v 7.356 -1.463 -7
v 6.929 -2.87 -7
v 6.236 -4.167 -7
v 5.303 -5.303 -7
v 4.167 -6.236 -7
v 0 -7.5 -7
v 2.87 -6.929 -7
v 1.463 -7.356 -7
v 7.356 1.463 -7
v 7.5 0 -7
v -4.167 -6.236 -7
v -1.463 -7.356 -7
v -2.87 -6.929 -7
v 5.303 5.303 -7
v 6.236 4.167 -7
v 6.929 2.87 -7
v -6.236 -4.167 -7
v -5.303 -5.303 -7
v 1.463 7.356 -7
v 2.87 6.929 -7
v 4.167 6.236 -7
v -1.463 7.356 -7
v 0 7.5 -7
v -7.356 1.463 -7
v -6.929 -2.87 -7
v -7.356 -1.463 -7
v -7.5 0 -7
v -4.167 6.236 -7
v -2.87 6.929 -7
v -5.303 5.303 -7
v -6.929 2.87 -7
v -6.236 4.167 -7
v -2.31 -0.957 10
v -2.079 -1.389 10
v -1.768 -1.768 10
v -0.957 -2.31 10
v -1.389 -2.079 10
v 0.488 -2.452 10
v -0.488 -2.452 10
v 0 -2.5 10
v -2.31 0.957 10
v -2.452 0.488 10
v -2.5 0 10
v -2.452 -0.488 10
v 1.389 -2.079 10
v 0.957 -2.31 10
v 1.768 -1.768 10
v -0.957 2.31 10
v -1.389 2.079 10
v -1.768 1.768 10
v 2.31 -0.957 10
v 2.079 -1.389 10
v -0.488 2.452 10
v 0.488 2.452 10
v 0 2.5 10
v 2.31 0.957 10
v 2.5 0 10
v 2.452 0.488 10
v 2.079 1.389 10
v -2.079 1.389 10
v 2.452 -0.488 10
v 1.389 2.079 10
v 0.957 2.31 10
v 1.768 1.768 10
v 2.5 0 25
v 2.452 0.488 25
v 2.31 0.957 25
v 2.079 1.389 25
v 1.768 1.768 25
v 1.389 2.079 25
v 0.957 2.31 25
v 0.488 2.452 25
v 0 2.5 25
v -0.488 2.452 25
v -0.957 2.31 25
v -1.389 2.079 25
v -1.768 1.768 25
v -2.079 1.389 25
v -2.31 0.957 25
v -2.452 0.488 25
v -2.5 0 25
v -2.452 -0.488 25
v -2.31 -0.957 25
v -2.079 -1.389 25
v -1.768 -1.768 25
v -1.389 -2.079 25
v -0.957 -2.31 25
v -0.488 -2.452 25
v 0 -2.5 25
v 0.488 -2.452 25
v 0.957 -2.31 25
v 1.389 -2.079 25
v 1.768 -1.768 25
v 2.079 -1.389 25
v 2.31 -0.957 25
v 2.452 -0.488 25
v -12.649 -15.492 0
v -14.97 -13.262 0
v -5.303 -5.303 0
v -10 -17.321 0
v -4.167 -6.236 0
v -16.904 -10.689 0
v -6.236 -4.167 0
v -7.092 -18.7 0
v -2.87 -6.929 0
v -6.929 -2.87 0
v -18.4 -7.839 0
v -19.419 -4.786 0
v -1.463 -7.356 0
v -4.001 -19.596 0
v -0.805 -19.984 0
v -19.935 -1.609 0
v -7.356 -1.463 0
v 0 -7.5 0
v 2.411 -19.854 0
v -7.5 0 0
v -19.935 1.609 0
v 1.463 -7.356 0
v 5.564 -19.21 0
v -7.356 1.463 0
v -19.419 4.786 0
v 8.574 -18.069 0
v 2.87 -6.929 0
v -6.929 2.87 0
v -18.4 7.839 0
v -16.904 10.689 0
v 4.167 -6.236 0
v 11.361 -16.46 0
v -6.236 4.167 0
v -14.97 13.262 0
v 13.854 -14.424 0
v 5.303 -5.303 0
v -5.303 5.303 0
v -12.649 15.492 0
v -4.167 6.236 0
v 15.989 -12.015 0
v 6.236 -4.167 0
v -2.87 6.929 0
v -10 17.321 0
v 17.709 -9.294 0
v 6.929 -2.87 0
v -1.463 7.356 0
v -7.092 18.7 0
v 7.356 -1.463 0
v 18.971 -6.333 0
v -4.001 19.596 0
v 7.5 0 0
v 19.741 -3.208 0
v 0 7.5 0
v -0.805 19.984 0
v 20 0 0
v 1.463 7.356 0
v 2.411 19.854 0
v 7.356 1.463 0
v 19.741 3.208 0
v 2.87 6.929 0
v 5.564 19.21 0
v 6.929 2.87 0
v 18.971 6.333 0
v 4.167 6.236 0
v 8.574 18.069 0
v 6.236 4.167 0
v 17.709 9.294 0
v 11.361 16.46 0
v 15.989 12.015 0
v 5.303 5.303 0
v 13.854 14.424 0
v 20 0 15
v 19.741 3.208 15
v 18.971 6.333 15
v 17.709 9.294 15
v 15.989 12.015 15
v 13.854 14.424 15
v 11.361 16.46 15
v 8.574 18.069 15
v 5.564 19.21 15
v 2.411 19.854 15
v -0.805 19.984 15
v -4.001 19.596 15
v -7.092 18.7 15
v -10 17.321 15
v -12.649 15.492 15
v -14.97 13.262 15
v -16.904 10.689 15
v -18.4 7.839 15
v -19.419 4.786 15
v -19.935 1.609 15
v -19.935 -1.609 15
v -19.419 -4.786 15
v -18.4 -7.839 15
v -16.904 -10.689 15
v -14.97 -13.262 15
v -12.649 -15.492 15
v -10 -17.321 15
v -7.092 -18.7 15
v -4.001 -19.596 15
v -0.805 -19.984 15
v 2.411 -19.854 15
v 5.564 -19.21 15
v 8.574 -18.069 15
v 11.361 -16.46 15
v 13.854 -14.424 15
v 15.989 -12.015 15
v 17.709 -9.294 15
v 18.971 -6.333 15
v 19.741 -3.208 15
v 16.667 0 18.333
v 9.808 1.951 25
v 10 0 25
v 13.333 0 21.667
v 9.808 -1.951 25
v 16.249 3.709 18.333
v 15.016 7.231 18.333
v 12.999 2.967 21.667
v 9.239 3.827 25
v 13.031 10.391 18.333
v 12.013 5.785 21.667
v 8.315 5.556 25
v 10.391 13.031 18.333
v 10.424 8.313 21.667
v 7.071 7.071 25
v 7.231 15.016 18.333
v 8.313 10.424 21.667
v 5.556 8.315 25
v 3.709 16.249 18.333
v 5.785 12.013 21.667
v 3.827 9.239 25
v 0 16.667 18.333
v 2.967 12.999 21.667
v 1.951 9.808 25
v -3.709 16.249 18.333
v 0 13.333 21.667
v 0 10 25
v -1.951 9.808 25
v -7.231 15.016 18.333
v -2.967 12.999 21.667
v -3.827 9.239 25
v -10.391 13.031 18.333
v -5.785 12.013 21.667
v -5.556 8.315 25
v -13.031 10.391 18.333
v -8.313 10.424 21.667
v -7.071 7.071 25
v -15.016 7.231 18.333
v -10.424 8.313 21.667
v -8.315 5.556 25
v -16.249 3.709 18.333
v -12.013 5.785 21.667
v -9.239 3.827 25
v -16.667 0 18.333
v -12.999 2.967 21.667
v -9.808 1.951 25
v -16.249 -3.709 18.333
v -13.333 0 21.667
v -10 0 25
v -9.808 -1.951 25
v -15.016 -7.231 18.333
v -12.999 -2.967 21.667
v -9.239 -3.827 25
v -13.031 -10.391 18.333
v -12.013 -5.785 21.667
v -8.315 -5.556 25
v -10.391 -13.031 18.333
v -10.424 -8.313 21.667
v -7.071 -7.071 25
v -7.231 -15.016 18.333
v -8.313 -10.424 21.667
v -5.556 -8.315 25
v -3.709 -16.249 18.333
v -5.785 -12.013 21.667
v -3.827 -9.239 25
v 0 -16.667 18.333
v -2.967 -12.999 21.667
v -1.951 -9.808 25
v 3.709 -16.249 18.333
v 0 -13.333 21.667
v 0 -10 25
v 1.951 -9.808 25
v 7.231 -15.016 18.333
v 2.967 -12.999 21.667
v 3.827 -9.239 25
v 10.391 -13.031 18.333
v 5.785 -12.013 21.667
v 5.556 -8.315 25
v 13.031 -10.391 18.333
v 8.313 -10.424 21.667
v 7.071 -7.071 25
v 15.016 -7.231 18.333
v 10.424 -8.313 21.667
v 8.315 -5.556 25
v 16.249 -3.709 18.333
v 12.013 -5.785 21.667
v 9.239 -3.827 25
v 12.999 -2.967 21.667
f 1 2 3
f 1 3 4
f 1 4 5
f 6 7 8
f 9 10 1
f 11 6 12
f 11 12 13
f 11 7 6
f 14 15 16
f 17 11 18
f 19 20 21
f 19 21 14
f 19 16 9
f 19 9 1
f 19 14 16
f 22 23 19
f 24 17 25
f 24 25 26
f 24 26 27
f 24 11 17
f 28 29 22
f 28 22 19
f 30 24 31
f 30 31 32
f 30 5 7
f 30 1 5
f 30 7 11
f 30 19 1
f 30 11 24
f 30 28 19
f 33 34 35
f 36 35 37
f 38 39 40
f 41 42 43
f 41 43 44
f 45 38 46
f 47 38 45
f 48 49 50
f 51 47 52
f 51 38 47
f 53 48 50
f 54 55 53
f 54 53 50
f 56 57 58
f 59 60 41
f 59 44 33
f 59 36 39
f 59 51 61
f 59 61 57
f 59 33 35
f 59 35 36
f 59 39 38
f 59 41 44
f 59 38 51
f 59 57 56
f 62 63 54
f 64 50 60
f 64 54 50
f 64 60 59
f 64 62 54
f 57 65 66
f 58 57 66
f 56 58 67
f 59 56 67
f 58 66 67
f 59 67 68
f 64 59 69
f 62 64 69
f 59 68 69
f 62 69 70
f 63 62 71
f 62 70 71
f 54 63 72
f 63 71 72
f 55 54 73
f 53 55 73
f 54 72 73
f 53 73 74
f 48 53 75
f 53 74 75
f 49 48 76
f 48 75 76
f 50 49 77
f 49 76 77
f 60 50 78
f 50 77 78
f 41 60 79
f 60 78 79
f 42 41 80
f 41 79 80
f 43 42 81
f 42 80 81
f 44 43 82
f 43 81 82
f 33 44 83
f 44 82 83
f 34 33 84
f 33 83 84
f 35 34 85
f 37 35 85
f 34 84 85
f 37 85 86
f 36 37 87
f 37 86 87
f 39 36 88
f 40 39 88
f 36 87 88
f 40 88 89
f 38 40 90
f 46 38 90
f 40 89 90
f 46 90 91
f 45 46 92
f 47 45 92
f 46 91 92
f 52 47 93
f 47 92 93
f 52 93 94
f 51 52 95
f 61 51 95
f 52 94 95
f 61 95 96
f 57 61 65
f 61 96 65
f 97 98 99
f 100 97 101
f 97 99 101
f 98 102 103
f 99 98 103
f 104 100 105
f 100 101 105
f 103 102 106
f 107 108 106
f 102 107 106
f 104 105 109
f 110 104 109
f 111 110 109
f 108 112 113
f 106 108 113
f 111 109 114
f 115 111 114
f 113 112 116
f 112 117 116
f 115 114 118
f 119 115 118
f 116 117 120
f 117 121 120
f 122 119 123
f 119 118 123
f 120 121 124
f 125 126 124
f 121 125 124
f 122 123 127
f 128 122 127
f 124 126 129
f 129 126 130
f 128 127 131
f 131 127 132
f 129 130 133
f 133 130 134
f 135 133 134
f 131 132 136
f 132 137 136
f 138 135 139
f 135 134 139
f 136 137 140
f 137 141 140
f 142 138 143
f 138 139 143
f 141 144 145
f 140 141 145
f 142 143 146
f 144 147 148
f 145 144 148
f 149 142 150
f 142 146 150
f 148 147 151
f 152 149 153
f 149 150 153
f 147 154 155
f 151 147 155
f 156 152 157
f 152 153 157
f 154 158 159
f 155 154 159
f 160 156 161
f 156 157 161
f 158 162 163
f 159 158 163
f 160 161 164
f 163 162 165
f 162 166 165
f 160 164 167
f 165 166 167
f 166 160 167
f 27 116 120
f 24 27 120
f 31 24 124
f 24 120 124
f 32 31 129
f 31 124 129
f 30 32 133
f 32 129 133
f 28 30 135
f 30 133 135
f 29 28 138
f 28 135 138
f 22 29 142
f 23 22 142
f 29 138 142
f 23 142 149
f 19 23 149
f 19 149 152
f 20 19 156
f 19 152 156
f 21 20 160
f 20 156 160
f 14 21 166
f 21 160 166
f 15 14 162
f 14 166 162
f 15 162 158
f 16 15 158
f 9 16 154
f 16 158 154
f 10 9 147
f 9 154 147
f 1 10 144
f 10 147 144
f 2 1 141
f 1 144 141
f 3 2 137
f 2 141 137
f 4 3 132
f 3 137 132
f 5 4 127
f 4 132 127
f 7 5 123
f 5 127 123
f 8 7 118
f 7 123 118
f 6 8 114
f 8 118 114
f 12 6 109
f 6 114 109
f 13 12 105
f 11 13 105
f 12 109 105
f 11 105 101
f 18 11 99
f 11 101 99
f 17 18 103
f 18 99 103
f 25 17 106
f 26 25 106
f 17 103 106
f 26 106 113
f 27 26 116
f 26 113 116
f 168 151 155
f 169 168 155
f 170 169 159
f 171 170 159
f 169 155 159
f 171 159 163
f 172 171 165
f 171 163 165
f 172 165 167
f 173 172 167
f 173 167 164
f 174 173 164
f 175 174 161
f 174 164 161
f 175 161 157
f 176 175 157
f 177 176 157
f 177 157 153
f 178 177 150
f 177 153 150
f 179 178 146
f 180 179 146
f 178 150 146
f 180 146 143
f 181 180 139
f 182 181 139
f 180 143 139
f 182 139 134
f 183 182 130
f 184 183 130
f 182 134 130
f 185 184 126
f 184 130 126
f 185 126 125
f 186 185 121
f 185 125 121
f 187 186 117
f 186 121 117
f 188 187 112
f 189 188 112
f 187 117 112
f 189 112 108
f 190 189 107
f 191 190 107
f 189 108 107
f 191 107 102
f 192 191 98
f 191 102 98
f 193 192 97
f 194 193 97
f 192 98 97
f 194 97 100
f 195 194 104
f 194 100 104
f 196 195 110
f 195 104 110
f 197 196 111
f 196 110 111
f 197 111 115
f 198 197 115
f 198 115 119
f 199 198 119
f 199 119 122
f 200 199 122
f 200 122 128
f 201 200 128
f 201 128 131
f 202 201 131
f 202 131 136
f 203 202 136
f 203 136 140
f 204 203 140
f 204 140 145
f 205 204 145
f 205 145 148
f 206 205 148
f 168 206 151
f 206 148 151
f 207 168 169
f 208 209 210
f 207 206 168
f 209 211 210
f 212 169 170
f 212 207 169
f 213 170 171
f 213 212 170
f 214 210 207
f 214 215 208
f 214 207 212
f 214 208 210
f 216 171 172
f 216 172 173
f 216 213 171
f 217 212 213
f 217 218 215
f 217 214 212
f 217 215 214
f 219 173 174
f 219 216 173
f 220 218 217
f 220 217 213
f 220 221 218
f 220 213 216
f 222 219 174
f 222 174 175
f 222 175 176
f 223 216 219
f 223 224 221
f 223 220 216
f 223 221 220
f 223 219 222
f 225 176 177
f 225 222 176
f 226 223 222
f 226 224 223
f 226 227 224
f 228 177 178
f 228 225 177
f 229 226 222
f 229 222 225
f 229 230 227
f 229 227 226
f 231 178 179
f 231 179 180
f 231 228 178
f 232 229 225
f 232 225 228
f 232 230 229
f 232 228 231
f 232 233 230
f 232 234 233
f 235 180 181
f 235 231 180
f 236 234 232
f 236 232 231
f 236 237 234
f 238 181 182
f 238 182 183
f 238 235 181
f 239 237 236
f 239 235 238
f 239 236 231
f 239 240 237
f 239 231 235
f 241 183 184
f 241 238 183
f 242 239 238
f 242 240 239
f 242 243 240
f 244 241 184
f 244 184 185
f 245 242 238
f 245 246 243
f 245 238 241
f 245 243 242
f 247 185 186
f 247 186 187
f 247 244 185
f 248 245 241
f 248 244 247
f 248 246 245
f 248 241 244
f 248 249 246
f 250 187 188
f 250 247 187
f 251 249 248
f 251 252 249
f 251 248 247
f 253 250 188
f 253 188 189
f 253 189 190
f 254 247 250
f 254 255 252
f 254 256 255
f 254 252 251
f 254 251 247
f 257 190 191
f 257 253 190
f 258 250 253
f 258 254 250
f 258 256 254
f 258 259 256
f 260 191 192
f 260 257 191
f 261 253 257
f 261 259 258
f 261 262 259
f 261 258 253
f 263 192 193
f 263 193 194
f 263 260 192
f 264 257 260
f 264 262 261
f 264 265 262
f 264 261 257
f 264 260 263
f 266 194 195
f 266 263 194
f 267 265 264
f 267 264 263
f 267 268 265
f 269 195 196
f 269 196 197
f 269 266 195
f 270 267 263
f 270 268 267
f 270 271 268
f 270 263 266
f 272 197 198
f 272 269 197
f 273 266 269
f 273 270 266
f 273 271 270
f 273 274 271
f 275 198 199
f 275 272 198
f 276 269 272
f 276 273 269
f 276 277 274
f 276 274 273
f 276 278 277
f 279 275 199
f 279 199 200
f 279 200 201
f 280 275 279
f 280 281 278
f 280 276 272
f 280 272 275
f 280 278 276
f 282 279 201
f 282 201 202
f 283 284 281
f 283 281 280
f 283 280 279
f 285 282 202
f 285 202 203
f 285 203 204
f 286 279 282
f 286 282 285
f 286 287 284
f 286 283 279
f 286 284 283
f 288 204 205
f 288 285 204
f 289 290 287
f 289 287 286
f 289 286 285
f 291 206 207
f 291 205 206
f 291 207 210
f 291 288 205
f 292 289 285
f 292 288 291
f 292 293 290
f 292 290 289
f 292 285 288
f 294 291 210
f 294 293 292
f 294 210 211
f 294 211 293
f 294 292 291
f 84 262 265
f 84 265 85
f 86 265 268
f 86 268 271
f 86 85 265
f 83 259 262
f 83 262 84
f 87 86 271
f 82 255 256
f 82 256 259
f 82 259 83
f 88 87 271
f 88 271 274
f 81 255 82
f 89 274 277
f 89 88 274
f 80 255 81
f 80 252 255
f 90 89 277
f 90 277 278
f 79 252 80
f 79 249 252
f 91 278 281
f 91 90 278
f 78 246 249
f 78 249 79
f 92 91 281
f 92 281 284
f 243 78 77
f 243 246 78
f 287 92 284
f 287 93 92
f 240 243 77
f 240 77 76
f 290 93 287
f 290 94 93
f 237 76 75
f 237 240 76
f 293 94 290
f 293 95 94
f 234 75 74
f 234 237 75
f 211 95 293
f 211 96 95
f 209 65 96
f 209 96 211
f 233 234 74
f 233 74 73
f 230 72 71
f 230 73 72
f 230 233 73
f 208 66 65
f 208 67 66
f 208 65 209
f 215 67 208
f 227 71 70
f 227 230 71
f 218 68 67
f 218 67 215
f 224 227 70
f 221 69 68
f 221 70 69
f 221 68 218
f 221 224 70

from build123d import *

# Parameters (mm, degrees)
SKETCH1_R           = 20
BOSS_EXTRUDE1_DEPTH = 25
CHAMFER1_SIZE       = 10
SKETCH2_R           = 2.5
CUT_EXTRUDE1_DEPTH  = 15
SKETCH3_R           = 7.5
BOSS_EXTRUDE2_DEPTH = 7


with BuildPart() as part:
    # Sketch1 → Boss-Extrude1 (new body)
    with BuildSketch(Plane.XY):
        Circle(SKETCH1_R)
    extrude(amount=BOSS_EXTRUDE1_DEPTH)

    # Chamfer1
    chamfer1_edges = [part.edges().sort_by_distance(p)[0] for p in [
        (-20, 0, 25),
    ]]
    chamfer(chamfer1_edges, length=CHAMFER1_SIZE)

    # Sketch2 → Cut-Extrude1 (cut)
    with BuildSketch(Plane.XY.offset(25)):
        Circle(SKETCH2_R)
    extrude(amount=-CUT_EXTRUDE1_DEPTH, mode=Mode.SUBTRACT)

    # Sketch3 → Boss-Extrude2 (add)
    with BuildSketch(Plane(origin=(0, 0, 0), x_dir=(-1, 0, 0), z_dir=(0, 0, -1))):
        Circle(SKETCH3_R)
    extrude(amount=BOSS_EXTRUDE2_DEPTH)


solid = part.part
